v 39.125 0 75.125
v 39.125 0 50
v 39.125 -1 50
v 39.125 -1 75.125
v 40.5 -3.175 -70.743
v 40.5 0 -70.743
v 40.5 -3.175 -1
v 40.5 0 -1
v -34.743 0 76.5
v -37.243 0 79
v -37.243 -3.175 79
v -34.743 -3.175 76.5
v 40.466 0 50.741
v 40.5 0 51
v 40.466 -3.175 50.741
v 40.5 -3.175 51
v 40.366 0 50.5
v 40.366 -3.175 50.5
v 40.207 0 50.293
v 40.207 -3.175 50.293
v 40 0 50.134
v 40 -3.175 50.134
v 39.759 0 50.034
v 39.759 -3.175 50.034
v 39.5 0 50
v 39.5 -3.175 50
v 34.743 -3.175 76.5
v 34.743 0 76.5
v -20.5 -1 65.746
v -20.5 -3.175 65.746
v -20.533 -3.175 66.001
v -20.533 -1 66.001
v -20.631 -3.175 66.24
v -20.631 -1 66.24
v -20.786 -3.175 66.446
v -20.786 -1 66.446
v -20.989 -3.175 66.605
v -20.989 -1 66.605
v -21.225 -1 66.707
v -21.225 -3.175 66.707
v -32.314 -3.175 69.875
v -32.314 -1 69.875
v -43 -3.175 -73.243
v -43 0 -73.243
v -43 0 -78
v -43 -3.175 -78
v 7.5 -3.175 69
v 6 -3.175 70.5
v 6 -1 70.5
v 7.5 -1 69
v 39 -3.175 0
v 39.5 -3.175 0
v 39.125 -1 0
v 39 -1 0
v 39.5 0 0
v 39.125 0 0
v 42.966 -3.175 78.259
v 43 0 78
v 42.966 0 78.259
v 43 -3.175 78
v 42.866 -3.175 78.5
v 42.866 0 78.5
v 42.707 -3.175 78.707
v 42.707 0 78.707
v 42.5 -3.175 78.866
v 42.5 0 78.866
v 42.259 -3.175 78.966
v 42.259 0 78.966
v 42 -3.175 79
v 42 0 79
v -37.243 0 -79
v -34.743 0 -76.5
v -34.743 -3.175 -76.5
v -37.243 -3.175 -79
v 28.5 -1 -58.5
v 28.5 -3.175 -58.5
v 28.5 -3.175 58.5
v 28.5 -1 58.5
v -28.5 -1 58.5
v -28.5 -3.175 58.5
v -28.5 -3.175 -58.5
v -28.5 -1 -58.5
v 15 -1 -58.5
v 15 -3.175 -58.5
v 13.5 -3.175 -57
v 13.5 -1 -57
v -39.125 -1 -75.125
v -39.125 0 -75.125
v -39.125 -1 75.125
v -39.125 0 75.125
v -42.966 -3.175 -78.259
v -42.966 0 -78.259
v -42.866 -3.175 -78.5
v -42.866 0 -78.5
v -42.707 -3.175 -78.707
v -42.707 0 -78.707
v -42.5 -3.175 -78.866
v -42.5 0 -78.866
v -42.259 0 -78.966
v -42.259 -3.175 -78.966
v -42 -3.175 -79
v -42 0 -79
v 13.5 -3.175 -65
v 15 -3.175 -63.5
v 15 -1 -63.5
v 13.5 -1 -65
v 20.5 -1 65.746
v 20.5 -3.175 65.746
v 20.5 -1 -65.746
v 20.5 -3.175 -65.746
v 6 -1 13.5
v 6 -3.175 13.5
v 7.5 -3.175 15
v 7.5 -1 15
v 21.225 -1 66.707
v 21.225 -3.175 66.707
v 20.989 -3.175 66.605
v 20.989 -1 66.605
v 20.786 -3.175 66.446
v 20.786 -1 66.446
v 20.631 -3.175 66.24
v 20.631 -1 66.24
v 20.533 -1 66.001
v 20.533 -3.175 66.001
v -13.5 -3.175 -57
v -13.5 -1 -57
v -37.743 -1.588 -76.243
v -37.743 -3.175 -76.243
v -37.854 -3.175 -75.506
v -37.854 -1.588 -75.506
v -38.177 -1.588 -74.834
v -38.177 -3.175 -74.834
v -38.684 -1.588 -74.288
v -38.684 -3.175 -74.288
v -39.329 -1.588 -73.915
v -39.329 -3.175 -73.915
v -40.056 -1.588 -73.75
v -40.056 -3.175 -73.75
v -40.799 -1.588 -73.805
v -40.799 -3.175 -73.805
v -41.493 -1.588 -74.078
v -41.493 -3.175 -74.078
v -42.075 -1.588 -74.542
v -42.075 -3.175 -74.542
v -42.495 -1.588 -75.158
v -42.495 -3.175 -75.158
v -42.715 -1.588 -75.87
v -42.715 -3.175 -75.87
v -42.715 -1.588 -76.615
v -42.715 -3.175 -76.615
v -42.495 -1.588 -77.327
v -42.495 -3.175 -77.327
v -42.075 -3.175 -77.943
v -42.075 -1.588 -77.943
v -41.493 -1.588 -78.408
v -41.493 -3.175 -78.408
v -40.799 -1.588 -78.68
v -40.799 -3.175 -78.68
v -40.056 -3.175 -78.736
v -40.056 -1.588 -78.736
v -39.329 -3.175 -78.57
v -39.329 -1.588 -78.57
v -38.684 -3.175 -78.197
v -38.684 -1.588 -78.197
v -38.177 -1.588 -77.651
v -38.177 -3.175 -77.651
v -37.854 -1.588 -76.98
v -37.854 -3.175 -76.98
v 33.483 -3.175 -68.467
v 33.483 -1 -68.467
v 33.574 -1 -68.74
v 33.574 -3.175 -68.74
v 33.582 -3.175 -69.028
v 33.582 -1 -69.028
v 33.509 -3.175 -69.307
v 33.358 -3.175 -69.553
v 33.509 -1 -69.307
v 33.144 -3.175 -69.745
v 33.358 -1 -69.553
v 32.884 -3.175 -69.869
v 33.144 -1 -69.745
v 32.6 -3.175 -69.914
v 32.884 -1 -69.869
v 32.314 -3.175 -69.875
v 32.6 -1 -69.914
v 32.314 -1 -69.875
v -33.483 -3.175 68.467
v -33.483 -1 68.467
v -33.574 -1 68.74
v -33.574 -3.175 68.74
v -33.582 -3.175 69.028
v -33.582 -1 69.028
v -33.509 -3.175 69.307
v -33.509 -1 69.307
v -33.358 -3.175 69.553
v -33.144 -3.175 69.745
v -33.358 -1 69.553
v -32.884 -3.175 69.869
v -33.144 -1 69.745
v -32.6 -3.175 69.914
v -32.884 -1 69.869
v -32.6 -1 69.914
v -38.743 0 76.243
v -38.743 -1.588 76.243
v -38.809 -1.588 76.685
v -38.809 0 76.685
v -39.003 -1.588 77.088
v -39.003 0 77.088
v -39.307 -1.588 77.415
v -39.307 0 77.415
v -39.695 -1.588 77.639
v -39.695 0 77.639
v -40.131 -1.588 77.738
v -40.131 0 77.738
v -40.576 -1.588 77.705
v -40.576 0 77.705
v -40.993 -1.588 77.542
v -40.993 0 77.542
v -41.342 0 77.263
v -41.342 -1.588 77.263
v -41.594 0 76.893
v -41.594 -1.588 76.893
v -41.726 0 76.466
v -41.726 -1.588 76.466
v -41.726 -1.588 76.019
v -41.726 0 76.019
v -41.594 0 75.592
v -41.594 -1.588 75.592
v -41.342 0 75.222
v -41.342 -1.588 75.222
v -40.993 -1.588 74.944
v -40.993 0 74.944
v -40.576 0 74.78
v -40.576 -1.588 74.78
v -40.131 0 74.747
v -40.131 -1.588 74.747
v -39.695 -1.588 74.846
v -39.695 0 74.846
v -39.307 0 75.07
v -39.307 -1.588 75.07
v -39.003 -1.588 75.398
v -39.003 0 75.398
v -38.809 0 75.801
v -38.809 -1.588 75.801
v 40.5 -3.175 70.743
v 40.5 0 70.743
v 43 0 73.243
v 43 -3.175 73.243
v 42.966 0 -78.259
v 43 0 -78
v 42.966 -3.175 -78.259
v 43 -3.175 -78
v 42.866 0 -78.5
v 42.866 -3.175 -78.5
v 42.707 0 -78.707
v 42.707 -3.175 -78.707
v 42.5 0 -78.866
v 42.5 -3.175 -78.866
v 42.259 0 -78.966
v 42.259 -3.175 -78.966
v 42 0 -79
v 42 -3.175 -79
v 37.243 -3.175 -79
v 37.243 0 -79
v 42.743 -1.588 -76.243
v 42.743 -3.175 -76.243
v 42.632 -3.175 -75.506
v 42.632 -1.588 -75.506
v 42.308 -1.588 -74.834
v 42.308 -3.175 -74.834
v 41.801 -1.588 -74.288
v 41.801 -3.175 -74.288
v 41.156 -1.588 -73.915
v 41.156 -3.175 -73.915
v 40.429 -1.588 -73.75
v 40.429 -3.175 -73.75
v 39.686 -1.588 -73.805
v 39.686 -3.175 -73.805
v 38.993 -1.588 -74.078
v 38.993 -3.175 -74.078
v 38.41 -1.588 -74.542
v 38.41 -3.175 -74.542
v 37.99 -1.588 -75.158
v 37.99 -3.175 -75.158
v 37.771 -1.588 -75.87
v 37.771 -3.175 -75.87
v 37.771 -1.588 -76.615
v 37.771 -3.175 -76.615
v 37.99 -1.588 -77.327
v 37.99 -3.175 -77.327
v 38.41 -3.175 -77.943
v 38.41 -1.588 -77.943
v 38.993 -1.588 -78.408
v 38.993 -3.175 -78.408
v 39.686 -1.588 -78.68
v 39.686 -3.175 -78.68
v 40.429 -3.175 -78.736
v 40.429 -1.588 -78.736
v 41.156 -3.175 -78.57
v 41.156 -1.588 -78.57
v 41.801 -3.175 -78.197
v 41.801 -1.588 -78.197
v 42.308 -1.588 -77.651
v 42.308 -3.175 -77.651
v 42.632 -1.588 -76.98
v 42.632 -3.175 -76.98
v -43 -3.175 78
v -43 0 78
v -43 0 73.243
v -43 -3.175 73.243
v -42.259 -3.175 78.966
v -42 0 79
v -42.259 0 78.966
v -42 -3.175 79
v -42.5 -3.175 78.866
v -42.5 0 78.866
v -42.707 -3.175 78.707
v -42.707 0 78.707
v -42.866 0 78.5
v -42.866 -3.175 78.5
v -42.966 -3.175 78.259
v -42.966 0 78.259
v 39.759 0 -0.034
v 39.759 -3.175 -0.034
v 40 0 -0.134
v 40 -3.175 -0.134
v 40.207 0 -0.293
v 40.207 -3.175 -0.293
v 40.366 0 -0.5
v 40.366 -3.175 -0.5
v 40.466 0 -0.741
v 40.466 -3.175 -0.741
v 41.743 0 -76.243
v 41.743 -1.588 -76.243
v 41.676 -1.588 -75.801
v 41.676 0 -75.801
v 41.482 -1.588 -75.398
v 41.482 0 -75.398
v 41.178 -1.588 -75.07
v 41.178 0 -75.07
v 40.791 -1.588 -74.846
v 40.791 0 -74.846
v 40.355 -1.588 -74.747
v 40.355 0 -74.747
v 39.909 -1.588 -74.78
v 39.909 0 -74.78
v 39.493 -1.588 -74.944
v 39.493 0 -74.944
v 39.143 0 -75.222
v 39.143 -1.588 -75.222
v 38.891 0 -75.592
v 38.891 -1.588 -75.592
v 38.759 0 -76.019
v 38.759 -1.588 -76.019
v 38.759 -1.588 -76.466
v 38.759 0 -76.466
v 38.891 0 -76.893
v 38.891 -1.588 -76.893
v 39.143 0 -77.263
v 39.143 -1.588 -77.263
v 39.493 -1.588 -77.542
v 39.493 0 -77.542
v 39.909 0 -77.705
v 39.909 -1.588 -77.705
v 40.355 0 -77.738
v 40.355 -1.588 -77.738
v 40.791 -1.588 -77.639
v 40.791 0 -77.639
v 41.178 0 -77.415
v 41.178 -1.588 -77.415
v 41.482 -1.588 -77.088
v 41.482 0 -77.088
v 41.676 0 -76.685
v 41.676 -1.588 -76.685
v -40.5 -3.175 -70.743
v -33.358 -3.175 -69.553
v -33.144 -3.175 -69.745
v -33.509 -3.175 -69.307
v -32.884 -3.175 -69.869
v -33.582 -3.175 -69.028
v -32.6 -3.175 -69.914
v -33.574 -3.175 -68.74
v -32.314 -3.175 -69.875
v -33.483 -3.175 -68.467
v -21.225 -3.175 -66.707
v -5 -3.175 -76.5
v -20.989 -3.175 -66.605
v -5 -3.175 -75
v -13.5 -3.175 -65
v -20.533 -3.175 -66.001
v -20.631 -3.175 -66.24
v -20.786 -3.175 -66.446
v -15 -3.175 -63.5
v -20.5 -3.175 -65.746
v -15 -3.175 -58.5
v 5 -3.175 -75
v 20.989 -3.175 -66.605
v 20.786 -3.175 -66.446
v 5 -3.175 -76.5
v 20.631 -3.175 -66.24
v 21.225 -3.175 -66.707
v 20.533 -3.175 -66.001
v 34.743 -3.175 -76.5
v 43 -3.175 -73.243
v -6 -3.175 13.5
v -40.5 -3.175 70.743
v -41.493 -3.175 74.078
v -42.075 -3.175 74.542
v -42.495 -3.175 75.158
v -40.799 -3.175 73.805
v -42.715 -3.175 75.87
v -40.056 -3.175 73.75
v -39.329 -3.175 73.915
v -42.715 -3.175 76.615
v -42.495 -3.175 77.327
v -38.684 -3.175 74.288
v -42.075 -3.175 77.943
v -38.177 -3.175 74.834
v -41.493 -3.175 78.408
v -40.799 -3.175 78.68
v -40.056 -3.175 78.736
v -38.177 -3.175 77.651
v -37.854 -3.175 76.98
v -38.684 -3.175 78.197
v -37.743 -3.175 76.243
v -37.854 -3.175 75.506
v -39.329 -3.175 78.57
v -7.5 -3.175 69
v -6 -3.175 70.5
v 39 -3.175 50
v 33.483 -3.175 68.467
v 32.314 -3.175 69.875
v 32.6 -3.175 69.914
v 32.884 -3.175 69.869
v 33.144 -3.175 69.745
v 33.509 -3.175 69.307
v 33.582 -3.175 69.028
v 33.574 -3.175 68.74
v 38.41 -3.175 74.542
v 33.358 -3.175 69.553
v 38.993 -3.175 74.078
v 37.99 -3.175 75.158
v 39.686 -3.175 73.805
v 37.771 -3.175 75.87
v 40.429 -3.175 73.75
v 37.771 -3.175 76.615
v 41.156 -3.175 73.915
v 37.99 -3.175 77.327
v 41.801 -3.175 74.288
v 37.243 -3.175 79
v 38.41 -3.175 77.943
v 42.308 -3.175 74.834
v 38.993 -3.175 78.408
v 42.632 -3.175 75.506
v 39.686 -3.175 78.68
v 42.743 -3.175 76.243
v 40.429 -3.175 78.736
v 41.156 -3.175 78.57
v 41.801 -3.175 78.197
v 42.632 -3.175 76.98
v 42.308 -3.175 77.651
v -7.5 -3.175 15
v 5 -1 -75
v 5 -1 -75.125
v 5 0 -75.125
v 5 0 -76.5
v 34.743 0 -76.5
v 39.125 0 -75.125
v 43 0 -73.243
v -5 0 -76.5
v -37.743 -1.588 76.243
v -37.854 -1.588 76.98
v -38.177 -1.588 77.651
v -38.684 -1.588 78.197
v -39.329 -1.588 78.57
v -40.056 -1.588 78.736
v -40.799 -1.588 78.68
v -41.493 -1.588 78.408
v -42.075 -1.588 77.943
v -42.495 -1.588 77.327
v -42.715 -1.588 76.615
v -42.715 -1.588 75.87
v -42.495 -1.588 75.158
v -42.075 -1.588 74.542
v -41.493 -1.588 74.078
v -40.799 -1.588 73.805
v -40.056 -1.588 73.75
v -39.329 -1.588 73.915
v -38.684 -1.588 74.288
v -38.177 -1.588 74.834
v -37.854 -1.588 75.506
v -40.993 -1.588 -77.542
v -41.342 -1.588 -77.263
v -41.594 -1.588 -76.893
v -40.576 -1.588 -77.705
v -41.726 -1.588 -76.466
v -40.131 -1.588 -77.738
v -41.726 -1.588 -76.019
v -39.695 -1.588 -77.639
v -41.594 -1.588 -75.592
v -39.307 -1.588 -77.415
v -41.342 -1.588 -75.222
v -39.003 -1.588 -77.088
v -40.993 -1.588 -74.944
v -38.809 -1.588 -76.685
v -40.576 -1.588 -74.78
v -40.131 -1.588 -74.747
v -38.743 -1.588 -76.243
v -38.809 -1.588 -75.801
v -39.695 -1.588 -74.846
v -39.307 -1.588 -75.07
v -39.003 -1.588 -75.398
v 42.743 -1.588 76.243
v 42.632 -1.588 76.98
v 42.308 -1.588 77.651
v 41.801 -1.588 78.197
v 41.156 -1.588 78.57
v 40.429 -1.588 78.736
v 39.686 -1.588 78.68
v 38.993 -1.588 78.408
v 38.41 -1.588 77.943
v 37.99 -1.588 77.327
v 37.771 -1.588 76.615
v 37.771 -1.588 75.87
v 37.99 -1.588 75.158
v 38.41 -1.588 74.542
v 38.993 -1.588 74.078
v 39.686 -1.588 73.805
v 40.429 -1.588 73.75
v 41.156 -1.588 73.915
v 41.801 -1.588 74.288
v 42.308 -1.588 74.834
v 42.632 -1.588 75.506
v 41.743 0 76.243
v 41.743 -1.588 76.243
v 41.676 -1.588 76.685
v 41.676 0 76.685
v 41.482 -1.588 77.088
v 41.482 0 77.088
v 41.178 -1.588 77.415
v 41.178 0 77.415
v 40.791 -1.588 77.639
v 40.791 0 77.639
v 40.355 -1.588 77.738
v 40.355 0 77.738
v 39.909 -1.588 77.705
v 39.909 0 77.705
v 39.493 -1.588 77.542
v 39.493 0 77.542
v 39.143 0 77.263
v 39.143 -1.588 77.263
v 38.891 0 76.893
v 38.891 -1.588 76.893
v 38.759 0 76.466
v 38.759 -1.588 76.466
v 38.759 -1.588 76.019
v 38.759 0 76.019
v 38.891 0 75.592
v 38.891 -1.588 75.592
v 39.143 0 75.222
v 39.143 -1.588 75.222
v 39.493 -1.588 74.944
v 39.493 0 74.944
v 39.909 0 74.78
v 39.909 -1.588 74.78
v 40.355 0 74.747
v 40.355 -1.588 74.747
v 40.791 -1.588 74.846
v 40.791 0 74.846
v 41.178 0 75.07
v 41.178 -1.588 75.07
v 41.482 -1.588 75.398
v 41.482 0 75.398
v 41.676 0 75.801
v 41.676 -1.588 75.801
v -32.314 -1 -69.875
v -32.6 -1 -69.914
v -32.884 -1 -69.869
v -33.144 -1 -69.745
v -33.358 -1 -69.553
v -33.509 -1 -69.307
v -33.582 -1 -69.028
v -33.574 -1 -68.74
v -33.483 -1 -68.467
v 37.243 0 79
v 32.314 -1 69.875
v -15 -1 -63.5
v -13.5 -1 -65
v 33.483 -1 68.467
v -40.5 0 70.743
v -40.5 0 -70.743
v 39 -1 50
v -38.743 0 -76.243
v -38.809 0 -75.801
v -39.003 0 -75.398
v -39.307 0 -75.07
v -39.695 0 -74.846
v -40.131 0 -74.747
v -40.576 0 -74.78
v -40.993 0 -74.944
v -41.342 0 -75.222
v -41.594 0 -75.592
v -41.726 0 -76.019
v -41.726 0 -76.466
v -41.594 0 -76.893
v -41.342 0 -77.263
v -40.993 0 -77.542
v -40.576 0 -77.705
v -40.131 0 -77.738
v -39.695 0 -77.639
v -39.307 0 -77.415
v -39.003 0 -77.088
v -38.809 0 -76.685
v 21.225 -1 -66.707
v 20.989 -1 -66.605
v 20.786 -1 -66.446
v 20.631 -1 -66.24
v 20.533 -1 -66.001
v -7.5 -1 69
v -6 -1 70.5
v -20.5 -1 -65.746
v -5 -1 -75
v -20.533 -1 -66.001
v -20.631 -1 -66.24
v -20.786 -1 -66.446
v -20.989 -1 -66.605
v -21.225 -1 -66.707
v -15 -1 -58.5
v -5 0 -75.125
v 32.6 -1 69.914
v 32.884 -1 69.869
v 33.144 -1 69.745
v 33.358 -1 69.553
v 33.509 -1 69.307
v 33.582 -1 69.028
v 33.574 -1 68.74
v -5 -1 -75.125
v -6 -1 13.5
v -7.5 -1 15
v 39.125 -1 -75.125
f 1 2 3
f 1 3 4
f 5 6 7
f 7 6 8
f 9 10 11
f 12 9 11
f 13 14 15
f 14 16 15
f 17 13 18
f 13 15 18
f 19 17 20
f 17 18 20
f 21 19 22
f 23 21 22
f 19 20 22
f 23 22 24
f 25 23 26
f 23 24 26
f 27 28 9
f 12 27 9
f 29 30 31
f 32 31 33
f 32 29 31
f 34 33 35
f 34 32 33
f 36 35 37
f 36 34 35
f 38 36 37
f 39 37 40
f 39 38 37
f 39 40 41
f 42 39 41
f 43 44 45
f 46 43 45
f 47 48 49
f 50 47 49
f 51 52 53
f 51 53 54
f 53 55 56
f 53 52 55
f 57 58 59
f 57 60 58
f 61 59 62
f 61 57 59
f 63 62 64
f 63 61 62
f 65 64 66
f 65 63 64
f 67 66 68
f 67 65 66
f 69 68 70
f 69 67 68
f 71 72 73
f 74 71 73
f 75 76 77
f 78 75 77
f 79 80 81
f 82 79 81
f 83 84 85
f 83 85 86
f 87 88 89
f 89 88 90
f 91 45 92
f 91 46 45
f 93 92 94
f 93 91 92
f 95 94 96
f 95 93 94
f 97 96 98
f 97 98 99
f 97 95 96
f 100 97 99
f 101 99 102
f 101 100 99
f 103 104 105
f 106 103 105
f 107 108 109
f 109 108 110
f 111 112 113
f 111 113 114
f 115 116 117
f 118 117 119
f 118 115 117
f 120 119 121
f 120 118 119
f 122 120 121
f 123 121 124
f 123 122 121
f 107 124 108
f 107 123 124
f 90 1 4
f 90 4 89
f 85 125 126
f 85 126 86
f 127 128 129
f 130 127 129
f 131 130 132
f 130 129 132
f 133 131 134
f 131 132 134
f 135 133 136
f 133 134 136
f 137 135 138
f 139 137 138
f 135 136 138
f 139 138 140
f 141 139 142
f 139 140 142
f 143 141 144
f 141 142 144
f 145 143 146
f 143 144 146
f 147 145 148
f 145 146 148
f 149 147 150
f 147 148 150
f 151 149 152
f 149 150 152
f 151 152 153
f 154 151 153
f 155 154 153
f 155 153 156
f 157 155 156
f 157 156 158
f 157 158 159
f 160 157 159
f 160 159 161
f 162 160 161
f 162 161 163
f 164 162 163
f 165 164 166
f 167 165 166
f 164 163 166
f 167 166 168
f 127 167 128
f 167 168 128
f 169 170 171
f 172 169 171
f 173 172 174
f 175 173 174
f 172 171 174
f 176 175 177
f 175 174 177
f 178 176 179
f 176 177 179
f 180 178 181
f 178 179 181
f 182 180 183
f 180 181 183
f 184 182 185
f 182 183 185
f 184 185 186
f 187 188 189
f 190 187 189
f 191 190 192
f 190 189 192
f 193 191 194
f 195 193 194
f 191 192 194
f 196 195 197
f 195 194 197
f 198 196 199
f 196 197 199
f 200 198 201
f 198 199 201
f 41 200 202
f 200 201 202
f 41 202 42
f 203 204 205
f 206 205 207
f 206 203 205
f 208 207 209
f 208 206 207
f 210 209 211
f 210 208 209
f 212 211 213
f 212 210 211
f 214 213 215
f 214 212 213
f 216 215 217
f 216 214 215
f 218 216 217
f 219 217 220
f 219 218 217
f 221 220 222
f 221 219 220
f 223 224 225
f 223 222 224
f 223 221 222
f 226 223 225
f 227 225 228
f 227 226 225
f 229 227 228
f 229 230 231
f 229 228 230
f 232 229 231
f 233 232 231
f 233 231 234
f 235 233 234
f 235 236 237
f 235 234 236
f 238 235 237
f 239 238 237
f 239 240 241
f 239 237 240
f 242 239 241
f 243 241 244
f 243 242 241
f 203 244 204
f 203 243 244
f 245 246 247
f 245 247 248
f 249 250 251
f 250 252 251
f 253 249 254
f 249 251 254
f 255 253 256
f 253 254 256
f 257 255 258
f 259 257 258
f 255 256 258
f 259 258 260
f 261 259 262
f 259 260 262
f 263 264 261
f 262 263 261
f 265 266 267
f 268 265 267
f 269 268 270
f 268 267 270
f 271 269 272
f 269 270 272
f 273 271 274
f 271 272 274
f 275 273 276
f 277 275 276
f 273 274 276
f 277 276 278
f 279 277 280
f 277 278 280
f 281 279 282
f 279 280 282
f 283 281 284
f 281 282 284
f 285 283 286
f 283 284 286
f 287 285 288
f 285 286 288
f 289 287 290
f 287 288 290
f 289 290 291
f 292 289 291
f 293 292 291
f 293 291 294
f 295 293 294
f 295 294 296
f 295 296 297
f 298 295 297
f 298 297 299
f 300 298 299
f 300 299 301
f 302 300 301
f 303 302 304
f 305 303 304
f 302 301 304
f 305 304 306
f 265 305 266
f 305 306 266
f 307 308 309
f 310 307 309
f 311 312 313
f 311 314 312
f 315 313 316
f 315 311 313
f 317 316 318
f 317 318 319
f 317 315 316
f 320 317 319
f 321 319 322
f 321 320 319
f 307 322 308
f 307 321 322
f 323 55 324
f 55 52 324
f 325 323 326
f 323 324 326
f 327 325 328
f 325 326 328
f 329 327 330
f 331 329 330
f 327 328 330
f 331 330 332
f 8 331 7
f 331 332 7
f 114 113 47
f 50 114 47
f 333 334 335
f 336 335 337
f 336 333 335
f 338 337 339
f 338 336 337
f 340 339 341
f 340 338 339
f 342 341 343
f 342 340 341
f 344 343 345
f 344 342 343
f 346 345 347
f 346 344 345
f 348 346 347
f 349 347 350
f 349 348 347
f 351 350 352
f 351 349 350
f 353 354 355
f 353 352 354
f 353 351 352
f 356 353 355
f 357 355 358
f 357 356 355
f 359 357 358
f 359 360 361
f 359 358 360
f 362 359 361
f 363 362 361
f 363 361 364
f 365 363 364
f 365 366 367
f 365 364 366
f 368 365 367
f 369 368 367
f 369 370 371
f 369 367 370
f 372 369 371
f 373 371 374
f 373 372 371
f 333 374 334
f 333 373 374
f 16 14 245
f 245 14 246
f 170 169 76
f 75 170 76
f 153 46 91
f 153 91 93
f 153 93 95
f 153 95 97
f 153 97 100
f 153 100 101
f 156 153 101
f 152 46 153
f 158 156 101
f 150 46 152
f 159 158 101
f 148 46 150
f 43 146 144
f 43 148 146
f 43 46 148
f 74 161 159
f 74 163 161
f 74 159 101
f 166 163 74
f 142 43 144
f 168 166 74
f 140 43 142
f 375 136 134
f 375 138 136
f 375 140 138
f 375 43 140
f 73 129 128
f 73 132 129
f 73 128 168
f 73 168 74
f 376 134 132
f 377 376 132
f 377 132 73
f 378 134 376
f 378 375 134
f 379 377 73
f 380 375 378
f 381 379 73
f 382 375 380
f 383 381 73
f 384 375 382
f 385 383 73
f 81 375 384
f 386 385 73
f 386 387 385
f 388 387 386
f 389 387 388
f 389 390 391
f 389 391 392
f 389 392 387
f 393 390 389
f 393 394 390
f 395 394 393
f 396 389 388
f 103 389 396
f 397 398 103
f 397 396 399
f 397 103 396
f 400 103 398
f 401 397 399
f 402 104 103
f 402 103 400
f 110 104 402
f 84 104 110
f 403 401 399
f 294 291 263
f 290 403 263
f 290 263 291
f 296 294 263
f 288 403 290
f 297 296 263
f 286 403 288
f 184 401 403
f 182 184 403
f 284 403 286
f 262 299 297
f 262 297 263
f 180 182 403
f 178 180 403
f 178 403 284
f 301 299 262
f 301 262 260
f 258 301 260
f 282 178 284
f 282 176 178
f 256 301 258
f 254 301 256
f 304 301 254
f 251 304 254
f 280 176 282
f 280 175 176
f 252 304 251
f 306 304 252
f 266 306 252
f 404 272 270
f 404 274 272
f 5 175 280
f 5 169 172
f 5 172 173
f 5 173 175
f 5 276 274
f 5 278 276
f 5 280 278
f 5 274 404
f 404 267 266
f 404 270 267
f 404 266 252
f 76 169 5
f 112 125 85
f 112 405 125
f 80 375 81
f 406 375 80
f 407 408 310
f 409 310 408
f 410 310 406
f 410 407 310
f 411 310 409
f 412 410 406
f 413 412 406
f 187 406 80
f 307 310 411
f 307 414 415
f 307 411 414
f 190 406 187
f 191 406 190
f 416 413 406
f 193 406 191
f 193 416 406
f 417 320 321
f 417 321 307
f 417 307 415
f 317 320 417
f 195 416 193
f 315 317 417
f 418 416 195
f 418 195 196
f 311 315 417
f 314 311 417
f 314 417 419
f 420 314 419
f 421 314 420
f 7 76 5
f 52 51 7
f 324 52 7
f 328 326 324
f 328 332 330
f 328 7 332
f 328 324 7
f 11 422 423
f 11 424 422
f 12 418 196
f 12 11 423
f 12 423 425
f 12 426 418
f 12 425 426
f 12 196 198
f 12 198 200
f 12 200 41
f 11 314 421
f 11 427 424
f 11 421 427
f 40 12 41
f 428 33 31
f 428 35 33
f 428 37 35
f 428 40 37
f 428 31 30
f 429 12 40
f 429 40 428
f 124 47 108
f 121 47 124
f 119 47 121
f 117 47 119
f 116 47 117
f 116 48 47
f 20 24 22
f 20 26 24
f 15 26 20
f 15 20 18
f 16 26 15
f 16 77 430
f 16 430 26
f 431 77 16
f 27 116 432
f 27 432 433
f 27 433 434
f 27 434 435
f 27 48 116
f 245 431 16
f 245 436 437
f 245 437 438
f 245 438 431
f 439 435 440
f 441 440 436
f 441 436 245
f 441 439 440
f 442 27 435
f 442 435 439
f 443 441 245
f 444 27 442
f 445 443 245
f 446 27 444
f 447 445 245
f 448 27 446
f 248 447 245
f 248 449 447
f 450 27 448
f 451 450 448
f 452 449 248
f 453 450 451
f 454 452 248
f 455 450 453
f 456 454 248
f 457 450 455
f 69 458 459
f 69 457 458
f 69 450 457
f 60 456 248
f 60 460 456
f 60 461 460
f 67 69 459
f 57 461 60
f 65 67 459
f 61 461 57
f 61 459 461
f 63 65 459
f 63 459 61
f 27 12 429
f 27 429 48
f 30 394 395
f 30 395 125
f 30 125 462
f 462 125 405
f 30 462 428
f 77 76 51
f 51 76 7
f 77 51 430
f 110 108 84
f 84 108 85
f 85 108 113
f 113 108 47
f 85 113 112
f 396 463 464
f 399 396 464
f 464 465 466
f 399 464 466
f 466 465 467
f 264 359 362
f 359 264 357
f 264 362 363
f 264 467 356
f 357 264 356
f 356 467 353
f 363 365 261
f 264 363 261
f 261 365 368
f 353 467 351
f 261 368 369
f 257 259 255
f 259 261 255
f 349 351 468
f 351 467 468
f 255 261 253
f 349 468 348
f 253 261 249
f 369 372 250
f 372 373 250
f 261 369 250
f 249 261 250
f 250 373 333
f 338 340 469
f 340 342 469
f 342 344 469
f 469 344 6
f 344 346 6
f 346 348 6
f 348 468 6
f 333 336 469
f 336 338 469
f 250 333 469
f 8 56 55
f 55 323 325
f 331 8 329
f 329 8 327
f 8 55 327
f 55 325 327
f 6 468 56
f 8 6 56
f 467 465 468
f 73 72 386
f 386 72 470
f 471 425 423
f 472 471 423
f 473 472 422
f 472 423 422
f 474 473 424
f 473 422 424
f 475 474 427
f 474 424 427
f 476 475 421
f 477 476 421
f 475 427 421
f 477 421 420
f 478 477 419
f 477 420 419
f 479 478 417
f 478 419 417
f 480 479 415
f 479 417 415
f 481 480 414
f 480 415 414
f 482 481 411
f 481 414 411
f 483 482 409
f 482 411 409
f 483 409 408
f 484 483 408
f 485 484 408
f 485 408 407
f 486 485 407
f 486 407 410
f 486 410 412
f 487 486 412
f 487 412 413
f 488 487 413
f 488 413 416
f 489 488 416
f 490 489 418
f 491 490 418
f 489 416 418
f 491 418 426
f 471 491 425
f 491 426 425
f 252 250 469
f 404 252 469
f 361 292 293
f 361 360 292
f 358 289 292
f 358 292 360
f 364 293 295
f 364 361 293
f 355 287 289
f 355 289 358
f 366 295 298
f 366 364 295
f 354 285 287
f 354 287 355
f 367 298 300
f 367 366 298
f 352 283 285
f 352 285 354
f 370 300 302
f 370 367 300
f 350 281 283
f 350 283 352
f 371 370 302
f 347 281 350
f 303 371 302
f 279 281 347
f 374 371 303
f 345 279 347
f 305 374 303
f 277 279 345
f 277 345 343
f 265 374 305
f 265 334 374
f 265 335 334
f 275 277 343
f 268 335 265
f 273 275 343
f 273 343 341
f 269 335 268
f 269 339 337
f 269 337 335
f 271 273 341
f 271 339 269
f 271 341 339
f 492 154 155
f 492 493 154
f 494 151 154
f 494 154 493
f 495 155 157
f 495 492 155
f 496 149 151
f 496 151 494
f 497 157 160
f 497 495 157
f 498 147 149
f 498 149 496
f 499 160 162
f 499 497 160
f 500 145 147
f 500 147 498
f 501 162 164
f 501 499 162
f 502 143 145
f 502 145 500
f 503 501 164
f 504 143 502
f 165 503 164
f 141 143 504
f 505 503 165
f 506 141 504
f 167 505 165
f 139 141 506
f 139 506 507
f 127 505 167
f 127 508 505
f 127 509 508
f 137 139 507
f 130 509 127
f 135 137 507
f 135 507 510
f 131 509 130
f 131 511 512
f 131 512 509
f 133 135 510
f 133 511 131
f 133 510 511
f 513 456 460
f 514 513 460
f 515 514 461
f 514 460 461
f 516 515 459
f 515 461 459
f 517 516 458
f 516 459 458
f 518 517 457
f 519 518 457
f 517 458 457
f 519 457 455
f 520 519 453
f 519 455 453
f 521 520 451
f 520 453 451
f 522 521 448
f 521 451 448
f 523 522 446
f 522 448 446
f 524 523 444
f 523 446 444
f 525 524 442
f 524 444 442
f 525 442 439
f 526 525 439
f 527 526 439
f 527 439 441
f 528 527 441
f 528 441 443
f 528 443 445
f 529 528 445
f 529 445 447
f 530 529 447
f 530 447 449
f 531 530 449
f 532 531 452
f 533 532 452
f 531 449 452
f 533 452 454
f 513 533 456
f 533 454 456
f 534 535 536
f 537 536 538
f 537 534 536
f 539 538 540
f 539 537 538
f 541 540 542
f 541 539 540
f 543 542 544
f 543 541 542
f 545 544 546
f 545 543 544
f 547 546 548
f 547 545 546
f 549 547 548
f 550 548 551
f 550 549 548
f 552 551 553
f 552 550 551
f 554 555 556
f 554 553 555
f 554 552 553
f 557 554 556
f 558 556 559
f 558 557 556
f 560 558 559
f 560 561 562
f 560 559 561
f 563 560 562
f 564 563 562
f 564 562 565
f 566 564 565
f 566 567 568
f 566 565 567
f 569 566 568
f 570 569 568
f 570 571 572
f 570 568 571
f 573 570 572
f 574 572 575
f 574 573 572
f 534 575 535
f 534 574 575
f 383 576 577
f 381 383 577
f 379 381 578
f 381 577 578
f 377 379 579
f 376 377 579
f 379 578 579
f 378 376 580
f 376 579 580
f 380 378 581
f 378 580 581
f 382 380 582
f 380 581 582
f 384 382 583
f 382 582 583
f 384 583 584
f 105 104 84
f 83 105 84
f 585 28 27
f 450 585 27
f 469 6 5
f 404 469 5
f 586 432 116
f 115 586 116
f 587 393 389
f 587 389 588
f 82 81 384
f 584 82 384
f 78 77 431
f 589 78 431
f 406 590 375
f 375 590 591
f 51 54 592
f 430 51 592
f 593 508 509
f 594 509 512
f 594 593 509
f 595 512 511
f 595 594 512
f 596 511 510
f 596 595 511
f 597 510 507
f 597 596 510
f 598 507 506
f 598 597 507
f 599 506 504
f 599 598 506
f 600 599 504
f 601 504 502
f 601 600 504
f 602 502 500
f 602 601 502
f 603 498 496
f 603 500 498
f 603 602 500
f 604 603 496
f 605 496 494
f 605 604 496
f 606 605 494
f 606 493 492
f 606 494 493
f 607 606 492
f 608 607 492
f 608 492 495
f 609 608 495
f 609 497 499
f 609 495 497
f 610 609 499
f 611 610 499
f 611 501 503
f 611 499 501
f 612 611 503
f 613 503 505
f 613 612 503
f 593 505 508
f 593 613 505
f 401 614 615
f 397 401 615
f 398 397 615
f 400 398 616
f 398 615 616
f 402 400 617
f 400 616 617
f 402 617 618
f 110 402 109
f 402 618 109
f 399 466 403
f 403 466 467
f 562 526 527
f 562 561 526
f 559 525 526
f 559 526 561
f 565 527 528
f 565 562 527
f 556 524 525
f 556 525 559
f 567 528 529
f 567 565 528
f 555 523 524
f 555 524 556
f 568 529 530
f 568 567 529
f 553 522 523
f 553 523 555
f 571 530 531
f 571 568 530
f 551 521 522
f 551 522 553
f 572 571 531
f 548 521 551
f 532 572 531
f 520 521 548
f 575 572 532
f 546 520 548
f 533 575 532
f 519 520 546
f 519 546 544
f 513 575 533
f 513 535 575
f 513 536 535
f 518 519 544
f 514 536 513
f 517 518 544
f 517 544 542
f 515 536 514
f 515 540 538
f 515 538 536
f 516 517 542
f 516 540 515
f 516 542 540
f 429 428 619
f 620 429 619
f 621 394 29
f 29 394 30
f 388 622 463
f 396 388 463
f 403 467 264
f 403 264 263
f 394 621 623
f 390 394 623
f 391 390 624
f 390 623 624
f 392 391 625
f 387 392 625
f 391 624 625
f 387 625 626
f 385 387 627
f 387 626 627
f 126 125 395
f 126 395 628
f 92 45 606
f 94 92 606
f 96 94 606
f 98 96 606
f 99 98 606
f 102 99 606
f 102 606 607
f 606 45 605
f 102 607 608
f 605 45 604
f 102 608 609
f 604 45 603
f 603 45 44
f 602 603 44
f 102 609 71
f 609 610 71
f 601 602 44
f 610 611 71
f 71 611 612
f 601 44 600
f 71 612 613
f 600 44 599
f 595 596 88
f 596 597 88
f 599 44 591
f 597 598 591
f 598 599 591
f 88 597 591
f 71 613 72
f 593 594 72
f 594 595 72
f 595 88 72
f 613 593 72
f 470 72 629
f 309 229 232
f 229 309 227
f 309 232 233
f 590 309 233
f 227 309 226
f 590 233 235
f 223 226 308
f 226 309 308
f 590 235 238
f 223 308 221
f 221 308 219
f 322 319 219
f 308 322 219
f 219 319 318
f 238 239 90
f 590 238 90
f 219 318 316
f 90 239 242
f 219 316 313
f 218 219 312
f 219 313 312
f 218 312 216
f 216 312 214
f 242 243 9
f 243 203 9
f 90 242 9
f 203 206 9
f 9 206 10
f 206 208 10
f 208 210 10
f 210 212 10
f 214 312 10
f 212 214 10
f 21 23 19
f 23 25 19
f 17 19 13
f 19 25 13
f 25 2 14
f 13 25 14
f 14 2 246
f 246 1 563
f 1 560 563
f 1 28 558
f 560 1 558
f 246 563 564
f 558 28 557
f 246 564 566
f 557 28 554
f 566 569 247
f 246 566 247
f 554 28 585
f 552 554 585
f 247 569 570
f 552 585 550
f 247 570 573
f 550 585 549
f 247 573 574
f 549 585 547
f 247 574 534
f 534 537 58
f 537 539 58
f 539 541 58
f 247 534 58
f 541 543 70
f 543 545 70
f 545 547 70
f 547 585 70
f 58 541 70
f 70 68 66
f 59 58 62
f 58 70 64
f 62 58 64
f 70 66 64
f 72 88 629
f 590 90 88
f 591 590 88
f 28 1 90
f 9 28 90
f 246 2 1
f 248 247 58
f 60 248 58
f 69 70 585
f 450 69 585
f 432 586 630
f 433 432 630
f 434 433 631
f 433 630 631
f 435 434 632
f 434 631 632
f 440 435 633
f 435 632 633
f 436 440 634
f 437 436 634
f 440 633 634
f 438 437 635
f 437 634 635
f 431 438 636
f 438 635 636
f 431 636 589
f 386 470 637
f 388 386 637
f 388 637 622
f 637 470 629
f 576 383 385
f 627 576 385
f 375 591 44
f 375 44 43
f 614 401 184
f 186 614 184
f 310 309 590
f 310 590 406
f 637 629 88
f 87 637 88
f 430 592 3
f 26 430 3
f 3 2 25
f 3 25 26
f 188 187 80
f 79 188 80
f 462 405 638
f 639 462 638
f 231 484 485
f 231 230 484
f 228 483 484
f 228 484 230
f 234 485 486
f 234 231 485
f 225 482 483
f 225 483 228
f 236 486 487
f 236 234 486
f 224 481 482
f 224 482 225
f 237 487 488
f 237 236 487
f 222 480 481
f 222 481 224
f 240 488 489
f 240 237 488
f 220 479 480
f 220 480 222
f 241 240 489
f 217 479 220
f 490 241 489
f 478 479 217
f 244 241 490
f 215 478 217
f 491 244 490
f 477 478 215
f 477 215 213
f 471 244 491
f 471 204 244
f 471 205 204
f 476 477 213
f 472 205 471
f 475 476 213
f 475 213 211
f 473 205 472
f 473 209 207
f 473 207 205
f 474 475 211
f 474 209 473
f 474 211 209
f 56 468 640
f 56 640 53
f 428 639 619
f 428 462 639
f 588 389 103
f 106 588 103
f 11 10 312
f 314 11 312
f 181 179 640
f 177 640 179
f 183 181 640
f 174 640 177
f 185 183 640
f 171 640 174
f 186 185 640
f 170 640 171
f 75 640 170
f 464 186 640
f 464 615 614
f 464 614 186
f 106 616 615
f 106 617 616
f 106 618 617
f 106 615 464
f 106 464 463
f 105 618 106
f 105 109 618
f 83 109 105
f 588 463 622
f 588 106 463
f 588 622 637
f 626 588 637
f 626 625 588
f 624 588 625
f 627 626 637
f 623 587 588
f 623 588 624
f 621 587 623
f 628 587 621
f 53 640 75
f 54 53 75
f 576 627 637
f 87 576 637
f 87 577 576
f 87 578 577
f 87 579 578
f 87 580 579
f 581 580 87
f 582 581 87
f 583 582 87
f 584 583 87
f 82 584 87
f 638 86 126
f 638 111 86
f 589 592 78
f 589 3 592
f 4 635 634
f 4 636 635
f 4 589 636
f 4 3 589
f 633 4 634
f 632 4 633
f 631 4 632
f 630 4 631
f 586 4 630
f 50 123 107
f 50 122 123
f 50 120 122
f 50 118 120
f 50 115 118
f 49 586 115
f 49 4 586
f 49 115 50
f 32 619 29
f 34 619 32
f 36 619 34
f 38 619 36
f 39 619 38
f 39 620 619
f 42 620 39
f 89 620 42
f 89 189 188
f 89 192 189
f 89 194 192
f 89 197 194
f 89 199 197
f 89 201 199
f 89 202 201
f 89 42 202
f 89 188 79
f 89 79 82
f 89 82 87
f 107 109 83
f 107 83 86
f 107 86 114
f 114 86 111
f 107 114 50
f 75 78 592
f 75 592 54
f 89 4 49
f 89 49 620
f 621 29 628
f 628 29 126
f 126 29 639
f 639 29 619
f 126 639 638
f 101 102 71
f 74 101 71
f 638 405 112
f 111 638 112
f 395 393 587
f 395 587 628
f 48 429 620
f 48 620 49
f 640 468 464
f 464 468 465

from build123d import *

# Parameters (mm, degrees)
F1_R      = 1.5
F1_W      = 24
F1_H      = 4
F2_DEPTH  = 3.175
F3_SIZE   = 2.49999
F4_R      = 1
F5_R      = 2.5
F6_DEPTH  = 1.5875
F7_W      = 15
F7_H      = 57
F7_W_2    = 30
F7_H_2    = 8
F8_DEPTH  = 3.176
F9_SIZE   = 1.5
F10_SIZE  = 1.5
F11_R     = 1
F12_W     = 78.25
F12_H     = 150.25
F13_DEPTH = 1


# Not quite as in the source:
# - a fillet or chamfer is up to 0.001 mm smaller than in the source, because OpenCascade refuses the exact size


with BuildPart() as f2:
    # F1 (on Front) → F2 (new body)
    with BuildSketch(Plane.XZ):
        Polygon((43, 73.2426406871), (43, 79), (37.2426406871, 79), (37.2426406871, 76.5), (-37.2426406871, 76.5), (-37.2426406871, 79), (-43, 79), (-43, 73.2426406871), (-40.5, 73.2426406871), (-40.5, -73.2426406871), (-43, -73.2426406871), (-43, -79), (-37.2426406871, -79), (-37.2426406871, -76.5), (-5, -76.5), (-5, -75), (5, -75), (5, -76.5), (37.2426406871, -76.5), (37.2426406871, -79), (43, -79), (43, -73.2426406871), (40.5, -73.2426406871), (40.5, 0), (39, 0), (39, 50), (40.5, 50), (40.5, 73.2426406871), align=None)
        with Locations((-40.2426406871, -76.2426406871)):
            Circle(F1_R, mode=Mode.SUBTRACT)
        with Locations((0, -61)):
            Rectangle(F1_W, F1_H, mode=Mode.SUBTRACT)
        with Locations((40.2426406871, -76.2426406871)):
            Circle(F1_R, mode=Mode.SUBTRACT)
        with Locations((-40.2426406871, 76.2426406871)):
            Circle(F1_R, mode=Mode.SUBTRACT)
        with BuildLine():
            ThreePointArc((-7.5, 58.5), (0, 66), (7.5, 58.5))
            Line((7.5, 58.5), (7.5, 25.5))
            ThreePointArc((7.5, 25.5), (0, 18), (-7.5, 25.5))
            Line((-7.5, 25.5), (-7.5, 58.5))
        make_face(mode=Mode.SUBTRACT)
        with Locations((40.2426406871, 76.2426406871)):
            Circle(F1_R, mode=Mode.SUBTRACT)
    extrude(amount=F2_DEPTH)

    # F3 (size 2.5 in the source; OpenCascade refuses exactly that, so slightly less here)
    f3_edges = [f2.edges().sort_by_distance(p)[0] for p in [
        (-37.242641, -1.5875, 76.5),
        (-40.5, -1.5875, 73.242641),
        (37.242641, -1.5875, 76.5),
        (40.5, -1.5875, 73.242641),
        (40.5, -1.5875, -73.242641),
        (37.242641, -1.5875, -76.5),
        (-37.242641, -1.5875, -76.5),
        (-40.5, -1.5875, -73.242641),
    ]]
    chamfer(f3_edges, length=F3_SIZE)

    # F4
    f4_edges = [f2.edges().sort_by_distance(p)[0] for p in [
        (43, -1.5875, 79),
        (-43, -1.5875, 79),
        (43, -1.5875, -79),
        (-43, -1.5875, -79),
        (40.5, -1.5875, 50),
        (40.5, -1.5875, 0),
    ]]
    fillet(f4_edges, radius=F4_R)

    # F5 (on face) → F6 (cut)
    with BuildSketch(Plane.XZ.offset(3.175)):
        with Locations((-40.2426406871, 76.2426406871)):
            Circle(F5_R)
        with Locations((40.2426406871, 76.2426406871)):
            Circle(F5_R)
        with Locations((40.2426406871, -76.2426406871)):
            Circle(F5_R)
        with Locations((-40.2426406871, -76.2426406871)):
            Circle(F5_R)
    extrude(amount=-F6_DEPTH, mode=Mode.SUBTRACT)

    # F7 (on face) → F8 (cut, through all)
    with BuildSketch(Plane.XZ.offset(3.175)):
        Polygon((-20.5, -66.5), (-20.5, 66.5), (-34.5, 70.5), (-28.5, 58.5), (-28.5, -58.5), (-34.5, -70.5), align=None)
        Polygon((34.5, 70.5), (20.5, 66.5), (20.5, -66.5), (34.5, -70.5), (28.5, -58.5), (28.5, 58.5), align=None)
        with Locations((0, 42)):
            Rectangle(F7_W, F7_H)
        with Locations((0, -61)):
            Rectangle(F7_W_2, F7_H_2)
    extrude(amount=-F8_DEPTH, mode=Mode.SUBTRACT)

    # F9
    f9_edges = [f2.edges().sort_by_distance(p)[0] for p in [
        (7.5, -1.5875, 70.5),
        (-7.5, -1.5875, 70.5),
        (-7.5, -1.5875, 13.5),
        (7.5, -1.5875, 13.5),
    ]]
    chamfer(f9_edges, length=F9_SIZE)

    # F10
    f10_edges = [f2.edges().sort_by_distance(p)[0] for p in [
        (-15, -1.5875, -65),
        (-15, -1.5875, -57),
        (15, -1.5875, -57),
        (15, -1.5875, -65),
    ]]
    chamfer(f10_edges, length=F10_SIZE)

    # F11
    f11_edges = [f2.edges().sort_by_distance(p)[0] for p in [
        (-34.5, -1.5875, 70.5),
        (-20.5, -1.5875, 66.5),
        (20.5, -1.5875, 66.5),
        (34.5, -1.5875, 70.5),
        (34.5, -1.5875, -70.5),
        (20.5, -1.5875, -66.5),
        (-34.5, -1.5875, -70.5),
        (-20.5, -1.5875, -66.5),
    ]]
    fillet(f11_edges, radius=F11_R)

    # F12 (on face) → F13 (cut)
    with BuildSketch(Plane(origin=(0, 0, 0), x_dir=(-1, 0, 0), z_dir=(0, 1, 0))):
        Rectangle(F12_W, F12_H)
    extrude(amount=-F13_DEPTH, mode=Mode.SUBTRACT)


solid = f2.part
